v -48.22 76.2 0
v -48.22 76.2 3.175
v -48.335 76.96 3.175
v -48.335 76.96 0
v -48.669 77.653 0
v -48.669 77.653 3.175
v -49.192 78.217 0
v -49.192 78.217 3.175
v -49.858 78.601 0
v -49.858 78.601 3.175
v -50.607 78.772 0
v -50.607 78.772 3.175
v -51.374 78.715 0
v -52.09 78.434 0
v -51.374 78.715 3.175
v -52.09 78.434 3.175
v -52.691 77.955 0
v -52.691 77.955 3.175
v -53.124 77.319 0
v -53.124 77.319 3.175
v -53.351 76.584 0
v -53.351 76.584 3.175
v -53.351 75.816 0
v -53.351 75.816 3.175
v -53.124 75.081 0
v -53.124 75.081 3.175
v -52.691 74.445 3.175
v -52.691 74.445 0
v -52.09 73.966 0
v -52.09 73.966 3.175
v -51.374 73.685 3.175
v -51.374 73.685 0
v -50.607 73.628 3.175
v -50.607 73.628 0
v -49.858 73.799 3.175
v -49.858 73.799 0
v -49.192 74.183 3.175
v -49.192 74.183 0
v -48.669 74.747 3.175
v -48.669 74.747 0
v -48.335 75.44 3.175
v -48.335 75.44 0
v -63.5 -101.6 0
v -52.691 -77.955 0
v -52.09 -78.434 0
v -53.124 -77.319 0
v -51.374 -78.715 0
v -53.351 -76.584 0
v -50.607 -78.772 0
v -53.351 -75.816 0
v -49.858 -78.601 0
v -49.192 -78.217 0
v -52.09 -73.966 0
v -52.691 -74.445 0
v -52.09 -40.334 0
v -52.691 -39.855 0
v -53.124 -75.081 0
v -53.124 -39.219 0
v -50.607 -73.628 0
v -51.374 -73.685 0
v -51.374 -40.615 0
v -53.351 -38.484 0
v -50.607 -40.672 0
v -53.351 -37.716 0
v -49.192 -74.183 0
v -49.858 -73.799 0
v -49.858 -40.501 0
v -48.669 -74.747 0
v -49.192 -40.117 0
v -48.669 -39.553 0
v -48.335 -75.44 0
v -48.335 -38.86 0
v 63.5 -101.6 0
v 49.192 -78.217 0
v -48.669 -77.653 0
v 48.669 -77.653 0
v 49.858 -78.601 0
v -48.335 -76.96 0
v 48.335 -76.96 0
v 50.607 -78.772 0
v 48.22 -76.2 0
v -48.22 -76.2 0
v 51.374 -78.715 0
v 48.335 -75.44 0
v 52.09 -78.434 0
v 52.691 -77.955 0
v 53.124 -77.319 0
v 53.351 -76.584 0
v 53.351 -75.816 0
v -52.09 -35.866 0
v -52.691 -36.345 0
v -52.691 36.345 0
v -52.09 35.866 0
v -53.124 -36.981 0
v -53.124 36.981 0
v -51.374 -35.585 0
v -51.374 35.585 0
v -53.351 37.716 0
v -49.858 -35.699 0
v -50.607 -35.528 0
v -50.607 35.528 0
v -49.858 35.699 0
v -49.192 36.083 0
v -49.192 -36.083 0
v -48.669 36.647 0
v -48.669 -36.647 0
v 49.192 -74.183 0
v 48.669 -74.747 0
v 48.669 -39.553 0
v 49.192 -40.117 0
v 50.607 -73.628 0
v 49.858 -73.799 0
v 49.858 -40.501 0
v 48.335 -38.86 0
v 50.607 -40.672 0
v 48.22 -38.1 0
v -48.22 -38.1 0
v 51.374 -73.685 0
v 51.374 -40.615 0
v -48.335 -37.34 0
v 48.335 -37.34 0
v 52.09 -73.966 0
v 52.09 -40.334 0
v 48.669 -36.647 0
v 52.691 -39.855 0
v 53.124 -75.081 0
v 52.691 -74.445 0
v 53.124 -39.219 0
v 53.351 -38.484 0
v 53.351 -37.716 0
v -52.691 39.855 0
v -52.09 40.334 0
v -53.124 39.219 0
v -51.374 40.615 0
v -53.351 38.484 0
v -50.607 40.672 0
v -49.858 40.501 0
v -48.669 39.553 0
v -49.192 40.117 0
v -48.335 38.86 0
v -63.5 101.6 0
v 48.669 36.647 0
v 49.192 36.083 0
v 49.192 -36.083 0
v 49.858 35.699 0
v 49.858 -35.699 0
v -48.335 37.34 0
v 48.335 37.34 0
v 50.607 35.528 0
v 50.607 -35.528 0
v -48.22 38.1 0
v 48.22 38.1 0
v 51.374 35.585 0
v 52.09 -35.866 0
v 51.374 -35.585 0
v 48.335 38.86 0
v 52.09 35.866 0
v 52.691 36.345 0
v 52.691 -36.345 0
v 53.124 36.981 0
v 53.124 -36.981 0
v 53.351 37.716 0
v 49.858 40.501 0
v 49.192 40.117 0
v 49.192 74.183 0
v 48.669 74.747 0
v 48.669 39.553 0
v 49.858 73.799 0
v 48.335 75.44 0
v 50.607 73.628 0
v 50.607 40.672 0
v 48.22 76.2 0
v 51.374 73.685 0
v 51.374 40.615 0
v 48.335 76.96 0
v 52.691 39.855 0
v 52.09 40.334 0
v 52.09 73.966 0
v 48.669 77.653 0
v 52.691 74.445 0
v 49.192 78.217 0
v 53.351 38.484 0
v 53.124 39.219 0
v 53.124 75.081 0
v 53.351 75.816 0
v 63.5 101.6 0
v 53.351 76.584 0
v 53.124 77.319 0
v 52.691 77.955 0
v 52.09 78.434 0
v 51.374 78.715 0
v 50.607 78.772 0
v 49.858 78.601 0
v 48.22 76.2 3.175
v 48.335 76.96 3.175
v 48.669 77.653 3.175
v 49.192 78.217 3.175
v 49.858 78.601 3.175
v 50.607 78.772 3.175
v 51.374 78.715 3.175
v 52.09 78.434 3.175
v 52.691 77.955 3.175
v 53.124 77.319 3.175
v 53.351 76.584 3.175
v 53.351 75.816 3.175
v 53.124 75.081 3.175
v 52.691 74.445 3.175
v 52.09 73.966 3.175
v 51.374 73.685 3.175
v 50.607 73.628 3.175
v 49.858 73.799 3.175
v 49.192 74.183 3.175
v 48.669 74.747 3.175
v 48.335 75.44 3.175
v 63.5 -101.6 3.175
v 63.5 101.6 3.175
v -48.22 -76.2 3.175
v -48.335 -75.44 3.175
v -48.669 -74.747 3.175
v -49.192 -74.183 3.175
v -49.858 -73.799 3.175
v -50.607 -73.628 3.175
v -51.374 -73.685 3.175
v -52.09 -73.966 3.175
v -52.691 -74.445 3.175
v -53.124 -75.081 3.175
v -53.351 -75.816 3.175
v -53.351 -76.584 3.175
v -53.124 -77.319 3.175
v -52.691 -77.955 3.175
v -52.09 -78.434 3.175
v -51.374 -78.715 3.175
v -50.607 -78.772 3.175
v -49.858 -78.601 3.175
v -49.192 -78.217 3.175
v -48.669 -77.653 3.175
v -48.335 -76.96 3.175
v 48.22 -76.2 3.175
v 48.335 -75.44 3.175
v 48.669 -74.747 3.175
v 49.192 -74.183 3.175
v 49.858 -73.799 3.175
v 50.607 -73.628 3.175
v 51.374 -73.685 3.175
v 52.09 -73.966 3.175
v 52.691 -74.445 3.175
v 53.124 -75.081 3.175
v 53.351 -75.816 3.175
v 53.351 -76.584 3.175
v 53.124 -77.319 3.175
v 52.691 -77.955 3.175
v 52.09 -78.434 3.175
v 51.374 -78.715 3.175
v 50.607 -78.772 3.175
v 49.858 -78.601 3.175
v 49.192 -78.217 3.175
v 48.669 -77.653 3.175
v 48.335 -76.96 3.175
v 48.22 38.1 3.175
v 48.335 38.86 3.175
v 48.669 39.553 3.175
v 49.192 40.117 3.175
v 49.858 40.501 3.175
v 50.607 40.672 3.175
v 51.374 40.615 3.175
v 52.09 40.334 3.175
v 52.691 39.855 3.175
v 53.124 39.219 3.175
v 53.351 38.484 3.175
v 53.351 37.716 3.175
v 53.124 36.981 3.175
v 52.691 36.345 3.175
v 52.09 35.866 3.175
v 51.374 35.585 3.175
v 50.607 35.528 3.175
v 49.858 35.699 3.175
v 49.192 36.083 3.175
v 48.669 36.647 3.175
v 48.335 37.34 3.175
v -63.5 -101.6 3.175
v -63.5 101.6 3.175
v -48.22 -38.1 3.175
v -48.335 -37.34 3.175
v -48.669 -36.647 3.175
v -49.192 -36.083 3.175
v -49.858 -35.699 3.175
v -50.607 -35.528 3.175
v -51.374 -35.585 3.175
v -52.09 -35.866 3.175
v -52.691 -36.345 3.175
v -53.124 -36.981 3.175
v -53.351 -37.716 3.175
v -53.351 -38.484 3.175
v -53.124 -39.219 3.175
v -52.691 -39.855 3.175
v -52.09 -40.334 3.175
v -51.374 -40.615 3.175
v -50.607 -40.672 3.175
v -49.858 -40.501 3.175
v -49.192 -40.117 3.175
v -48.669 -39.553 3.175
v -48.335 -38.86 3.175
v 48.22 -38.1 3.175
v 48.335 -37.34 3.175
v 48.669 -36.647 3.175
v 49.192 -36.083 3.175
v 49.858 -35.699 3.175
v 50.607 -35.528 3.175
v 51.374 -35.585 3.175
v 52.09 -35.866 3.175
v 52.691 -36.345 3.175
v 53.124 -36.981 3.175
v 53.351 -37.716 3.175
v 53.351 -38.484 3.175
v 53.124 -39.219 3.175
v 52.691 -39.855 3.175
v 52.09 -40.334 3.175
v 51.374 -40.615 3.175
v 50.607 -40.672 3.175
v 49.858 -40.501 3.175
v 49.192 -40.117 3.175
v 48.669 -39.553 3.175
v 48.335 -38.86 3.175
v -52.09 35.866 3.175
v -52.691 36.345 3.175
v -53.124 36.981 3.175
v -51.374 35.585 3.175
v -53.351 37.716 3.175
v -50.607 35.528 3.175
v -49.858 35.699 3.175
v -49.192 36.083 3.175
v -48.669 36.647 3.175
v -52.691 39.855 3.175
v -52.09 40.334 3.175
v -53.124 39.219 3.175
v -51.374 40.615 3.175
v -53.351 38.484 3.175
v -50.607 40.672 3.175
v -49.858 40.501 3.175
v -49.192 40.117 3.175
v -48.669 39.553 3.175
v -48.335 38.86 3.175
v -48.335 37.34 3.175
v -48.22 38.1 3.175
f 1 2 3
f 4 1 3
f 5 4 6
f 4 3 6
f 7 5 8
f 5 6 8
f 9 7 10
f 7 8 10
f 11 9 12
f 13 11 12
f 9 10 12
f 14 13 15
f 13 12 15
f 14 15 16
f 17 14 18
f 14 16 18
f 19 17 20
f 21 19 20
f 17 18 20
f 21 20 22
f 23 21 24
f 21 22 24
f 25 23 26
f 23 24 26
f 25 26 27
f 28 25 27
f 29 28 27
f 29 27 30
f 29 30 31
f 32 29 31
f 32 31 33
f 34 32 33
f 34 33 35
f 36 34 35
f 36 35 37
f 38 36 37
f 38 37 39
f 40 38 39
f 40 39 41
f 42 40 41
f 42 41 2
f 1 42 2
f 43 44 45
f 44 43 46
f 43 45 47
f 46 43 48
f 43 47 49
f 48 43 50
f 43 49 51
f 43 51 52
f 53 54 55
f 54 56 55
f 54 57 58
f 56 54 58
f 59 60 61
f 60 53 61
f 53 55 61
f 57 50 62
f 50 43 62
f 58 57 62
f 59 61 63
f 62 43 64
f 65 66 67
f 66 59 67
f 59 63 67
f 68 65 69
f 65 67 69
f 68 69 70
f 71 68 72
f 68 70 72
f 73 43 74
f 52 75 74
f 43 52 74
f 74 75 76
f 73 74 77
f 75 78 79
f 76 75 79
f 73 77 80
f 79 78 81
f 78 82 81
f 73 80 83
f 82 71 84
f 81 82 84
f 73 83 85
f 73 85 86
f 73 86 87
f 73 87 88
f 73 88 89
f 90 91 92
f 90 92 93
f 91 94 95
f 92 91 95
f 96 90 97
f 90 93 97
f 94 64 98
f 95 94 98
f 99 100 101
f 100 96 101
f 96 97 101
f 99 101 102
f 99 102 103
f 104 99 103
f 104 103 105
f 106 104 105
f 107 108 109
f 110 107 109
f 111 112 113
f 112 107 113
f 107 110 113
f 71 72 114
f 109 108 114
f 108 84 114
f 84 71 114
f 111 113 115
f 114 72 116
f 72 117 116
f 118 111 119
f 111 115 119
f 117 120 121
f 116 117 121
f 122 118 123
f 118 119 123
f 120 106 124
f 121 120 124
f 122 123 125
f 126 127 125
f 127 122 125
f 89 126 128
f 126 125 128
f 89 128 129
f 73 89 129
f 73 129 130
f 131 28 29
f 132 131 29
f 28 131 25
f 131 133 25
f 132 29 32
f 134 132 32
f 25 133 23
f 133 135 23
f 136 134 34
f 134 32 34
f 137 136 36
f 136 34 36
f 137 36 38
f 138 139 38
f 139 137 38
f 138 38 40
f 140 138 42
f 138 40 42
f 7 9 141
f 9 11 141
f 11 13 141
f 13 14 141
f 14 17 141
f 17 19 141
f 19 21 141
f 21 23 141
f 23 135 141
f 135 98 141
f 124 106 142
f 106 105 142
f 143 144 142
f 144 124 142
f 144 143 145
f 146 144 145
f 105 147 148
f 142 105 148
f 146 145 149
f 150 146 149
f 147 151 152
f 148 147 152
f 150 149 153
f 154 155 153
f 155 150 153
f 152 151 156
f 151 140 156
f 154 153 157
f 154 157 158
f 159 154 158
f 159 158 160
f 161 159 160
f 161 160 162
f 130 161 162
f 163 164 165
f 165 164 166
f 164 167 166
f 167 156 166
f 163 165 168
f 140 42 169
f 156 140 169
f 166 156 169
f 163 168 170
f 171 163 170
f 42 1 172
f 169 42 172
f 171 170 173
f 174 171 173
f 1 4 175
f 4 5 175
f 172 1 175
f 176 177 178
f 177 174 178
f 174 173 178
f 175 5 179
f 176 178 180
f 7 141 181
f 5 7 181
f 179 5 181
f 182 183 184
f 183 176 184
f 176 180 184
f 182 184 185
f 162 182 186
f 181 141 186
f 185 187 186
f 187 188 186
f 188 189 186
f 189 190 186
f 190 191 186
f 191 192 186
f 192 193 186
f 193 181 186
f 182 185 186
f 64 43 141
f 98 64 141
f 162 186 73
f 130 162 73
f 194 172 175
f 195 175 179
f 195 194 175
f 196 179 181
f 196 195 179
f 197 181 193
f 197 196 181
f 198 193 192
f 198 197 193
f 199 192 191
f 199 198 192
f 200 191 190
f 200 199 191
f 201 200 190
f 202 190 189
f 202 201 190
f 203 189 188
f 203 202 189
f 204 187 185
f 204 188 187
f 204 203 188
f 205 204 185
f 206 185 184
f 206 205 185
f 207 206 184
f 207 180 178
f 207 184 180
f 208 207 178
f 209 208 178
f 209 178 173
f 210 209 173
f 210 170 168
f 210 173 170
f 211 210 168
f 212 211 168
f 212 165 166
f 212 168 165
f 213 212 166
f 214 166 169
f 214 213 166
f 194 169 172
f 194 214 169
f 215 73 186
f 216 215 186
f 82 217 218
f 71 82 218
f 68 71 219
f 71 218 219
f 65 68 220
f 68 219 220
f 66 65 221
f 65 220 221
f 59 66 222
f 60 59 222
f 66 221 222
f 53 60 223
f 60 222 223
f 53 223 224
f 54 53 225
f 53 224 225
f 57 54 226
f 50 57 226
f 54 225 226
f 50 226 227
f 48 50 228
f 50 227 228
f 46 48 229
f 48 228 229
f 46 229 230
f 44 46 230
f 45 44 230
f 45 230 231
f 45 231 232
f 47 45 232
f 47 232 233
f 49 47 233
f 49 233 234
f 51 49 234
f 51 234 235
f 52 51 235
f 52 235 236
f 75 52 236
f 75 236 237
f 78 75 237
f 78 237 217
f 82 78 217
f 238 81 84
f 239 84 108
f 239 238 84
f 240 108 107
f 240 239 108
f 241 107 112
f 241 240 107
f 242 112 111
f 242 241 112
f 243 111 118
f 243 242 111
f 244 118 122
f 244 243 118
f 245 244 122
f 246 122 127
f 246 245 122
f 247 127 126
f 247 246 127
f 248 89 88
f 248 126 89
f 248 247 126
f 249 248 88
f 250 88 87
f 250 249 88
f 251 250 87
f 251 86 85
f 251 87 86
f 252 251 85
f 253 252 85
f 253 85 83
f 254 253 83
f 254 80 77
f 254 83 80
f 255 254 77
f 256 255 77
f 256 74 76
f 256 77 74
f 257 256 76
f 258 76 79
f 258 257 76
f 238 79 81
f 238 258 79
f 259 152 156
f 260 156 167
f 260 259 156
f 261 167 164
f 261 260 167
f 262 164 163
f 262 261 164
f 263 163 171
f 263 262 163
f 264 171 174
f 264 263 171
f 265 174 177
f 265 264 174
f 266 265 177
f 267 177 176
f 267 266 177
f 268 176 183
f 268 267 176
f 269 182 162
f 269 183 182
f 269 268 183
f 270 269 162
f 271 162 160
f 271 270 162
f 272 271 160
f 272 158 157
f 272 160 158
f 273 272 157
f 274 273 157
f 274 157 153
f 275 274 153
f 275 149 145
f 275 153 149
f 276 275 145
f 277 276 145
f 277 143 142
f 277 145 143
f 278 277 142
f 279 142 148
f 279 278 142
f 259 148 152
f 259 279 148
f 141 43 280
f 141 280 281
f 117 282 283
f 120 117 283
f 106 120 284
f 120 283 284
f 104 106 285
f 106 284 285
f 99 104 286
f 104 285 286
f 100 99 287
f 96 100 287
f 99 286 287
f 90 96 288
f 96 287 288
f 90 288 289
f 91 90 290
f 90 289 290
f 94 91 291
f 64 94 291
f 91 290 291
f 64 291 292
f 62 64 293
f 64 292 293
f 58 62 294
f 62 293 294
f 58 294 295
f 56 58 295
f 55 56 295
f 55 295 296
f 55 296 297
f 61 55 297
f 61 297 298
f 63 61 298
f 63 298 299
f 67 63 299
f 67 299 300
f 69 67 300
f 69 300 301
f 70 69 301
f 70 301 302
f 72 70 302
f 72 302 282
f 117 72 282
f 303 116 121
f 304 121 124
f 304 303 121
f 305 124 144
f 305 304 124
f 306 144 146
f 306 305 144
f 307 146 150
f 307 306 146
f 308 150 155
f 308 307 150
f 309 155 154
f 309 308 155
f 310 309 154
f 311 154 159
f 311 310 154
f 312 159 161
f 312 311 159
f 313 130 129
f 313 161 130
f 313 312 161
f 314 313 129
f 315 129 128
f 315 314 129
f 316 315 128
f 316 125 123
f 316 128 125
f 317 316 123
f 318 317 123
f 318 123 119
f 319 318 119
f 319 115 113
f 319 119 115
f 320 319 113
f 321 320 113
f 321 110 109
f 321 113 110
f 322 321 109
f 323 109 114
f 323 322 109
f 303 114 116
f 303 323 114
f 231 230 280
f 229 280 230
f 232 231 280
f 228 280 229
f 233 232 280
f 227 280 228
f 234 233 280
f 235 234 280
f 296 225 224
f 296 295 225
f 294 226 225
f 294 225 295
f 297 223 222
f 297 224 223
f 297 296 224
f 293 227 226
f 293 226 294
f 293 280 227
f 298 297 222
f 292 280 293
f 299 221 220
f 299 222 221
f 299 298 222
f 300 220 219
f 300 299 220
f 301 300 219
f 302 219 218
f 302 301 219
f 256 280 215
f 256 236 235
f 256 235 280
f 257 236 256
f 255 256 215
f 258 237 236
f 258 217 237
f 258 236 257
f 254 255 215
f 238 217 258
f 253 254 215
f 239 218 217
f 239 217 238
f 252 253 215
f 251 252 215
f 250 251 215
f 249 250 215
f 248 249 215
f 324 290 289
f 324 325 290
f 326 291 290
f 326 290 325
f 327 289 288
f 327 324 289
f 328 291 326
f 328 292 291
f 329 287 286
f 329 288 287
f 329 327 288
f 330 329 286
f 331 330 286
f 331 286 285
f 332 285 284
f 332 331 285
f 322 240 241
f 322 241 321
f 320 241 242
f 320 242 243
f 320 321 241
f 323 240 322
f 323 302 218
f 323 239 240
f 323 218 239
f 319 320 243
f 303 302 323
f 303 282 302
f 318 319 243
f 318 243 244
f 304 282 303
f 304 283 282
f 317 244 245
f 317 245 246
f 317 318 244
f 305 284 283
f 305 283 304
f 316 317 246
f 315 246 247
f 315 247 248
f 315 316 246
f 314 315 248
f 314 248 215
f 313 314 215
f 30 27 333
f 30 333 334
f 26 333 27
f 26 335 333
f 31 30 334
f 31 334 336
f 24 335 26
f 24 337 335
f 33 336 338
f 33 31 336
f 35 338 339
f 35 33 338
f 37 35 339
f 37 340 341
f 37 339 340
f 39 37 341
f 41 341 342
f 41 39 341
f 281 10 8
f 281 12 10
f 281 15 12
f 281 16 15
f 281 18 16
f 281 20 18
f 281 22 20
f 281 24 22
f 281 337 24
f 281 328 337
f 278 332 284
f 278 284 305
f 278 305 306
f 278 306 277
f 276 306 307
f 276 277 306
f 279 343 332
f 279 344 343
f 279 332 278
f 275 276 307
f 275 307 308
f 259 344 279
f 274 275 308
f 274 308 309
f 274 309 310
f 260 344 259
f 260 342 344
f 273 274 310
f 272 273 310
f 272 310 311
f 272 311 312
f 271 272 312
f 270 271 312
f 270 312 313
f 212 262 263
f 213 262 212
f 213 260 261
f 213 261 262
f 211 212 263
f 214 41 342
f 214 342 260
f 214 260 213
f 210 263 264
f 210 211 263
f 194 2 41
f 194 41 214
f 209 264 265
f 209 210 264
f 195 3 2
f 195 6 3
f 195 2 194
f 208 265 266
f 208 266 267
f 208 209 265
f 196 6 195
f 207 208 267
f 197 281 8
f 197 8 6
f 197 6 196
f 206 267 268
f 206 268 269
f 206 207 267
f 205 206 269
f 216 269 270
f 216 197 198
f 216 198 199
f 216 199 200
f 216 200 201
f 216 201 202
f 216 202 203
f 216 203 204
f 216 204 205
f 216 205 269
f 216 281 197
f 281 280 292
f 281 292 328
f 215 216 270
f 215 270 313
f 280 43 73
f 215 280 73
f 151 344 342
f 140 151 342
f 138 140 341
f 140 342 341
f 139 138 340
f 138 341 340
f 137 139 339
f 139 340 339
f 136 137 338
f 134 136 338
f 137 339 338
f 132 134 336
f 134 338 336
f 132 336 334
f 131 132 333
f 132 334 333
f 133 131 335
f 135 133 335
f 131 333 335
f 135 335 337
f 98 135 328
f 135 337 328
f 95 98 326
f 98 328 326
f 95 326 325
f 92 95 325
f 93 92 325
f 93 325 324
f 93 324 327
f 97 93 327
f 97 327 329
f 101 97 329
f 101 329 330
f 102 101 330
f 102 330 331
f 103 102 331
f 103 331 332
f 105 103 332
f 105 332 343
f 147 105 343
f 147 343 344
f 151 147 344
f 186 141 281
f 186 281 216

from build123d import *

# Parameters (mm, degrees)
SKETCH1_W           = 127
SKETCH1_H           = 203.2
BOSS_EXTRUDE1_DEPTH = 3.175
SKETCH2_R           = 2.5796875
CUT_EXTRUDE1_DEPTH  = 6.35


with BuildPart() as part:
    # Sketch1 → Boss-Extrude1 (new body)
    with BuildSketch(Plane.XY):
        Rectangle(SKETCH1_W, SKETCH1_H)
    extrude(amount=BOSS_EXTRUDE1_DEPTH)

    # Sketch2 → Cut-Extrude1 (cut)
    with BuildSketch(Plane.XY.offset(3.175)):
        with Locations((-50.8, 76.2)):
            Circle(SKETCH2_R)
        with Locations((-50.8, 38.1)):
            Circle(SKETCH2_R)
        with Locations((-50.8, -38.1)):
            Circle(SKETCH2_R)
        with Locations((-50.8, -76.2)):
            Circle(SKETCH2_R)
    cut_extrude1 = extrude(amount=-CUT_EXTRUDE1_DEPTH, mode=Mode.SUBTRACT)

    # Mirror1: Cut-Extrude1 across plane
    add(cut_extrude1.mirror(Plane(origin=(0, 0, 0), x_dir=(0, 0, 1), z_dir=(1, 0, 0))), mode=Mode.SUBTRACT)


solid = part.part
